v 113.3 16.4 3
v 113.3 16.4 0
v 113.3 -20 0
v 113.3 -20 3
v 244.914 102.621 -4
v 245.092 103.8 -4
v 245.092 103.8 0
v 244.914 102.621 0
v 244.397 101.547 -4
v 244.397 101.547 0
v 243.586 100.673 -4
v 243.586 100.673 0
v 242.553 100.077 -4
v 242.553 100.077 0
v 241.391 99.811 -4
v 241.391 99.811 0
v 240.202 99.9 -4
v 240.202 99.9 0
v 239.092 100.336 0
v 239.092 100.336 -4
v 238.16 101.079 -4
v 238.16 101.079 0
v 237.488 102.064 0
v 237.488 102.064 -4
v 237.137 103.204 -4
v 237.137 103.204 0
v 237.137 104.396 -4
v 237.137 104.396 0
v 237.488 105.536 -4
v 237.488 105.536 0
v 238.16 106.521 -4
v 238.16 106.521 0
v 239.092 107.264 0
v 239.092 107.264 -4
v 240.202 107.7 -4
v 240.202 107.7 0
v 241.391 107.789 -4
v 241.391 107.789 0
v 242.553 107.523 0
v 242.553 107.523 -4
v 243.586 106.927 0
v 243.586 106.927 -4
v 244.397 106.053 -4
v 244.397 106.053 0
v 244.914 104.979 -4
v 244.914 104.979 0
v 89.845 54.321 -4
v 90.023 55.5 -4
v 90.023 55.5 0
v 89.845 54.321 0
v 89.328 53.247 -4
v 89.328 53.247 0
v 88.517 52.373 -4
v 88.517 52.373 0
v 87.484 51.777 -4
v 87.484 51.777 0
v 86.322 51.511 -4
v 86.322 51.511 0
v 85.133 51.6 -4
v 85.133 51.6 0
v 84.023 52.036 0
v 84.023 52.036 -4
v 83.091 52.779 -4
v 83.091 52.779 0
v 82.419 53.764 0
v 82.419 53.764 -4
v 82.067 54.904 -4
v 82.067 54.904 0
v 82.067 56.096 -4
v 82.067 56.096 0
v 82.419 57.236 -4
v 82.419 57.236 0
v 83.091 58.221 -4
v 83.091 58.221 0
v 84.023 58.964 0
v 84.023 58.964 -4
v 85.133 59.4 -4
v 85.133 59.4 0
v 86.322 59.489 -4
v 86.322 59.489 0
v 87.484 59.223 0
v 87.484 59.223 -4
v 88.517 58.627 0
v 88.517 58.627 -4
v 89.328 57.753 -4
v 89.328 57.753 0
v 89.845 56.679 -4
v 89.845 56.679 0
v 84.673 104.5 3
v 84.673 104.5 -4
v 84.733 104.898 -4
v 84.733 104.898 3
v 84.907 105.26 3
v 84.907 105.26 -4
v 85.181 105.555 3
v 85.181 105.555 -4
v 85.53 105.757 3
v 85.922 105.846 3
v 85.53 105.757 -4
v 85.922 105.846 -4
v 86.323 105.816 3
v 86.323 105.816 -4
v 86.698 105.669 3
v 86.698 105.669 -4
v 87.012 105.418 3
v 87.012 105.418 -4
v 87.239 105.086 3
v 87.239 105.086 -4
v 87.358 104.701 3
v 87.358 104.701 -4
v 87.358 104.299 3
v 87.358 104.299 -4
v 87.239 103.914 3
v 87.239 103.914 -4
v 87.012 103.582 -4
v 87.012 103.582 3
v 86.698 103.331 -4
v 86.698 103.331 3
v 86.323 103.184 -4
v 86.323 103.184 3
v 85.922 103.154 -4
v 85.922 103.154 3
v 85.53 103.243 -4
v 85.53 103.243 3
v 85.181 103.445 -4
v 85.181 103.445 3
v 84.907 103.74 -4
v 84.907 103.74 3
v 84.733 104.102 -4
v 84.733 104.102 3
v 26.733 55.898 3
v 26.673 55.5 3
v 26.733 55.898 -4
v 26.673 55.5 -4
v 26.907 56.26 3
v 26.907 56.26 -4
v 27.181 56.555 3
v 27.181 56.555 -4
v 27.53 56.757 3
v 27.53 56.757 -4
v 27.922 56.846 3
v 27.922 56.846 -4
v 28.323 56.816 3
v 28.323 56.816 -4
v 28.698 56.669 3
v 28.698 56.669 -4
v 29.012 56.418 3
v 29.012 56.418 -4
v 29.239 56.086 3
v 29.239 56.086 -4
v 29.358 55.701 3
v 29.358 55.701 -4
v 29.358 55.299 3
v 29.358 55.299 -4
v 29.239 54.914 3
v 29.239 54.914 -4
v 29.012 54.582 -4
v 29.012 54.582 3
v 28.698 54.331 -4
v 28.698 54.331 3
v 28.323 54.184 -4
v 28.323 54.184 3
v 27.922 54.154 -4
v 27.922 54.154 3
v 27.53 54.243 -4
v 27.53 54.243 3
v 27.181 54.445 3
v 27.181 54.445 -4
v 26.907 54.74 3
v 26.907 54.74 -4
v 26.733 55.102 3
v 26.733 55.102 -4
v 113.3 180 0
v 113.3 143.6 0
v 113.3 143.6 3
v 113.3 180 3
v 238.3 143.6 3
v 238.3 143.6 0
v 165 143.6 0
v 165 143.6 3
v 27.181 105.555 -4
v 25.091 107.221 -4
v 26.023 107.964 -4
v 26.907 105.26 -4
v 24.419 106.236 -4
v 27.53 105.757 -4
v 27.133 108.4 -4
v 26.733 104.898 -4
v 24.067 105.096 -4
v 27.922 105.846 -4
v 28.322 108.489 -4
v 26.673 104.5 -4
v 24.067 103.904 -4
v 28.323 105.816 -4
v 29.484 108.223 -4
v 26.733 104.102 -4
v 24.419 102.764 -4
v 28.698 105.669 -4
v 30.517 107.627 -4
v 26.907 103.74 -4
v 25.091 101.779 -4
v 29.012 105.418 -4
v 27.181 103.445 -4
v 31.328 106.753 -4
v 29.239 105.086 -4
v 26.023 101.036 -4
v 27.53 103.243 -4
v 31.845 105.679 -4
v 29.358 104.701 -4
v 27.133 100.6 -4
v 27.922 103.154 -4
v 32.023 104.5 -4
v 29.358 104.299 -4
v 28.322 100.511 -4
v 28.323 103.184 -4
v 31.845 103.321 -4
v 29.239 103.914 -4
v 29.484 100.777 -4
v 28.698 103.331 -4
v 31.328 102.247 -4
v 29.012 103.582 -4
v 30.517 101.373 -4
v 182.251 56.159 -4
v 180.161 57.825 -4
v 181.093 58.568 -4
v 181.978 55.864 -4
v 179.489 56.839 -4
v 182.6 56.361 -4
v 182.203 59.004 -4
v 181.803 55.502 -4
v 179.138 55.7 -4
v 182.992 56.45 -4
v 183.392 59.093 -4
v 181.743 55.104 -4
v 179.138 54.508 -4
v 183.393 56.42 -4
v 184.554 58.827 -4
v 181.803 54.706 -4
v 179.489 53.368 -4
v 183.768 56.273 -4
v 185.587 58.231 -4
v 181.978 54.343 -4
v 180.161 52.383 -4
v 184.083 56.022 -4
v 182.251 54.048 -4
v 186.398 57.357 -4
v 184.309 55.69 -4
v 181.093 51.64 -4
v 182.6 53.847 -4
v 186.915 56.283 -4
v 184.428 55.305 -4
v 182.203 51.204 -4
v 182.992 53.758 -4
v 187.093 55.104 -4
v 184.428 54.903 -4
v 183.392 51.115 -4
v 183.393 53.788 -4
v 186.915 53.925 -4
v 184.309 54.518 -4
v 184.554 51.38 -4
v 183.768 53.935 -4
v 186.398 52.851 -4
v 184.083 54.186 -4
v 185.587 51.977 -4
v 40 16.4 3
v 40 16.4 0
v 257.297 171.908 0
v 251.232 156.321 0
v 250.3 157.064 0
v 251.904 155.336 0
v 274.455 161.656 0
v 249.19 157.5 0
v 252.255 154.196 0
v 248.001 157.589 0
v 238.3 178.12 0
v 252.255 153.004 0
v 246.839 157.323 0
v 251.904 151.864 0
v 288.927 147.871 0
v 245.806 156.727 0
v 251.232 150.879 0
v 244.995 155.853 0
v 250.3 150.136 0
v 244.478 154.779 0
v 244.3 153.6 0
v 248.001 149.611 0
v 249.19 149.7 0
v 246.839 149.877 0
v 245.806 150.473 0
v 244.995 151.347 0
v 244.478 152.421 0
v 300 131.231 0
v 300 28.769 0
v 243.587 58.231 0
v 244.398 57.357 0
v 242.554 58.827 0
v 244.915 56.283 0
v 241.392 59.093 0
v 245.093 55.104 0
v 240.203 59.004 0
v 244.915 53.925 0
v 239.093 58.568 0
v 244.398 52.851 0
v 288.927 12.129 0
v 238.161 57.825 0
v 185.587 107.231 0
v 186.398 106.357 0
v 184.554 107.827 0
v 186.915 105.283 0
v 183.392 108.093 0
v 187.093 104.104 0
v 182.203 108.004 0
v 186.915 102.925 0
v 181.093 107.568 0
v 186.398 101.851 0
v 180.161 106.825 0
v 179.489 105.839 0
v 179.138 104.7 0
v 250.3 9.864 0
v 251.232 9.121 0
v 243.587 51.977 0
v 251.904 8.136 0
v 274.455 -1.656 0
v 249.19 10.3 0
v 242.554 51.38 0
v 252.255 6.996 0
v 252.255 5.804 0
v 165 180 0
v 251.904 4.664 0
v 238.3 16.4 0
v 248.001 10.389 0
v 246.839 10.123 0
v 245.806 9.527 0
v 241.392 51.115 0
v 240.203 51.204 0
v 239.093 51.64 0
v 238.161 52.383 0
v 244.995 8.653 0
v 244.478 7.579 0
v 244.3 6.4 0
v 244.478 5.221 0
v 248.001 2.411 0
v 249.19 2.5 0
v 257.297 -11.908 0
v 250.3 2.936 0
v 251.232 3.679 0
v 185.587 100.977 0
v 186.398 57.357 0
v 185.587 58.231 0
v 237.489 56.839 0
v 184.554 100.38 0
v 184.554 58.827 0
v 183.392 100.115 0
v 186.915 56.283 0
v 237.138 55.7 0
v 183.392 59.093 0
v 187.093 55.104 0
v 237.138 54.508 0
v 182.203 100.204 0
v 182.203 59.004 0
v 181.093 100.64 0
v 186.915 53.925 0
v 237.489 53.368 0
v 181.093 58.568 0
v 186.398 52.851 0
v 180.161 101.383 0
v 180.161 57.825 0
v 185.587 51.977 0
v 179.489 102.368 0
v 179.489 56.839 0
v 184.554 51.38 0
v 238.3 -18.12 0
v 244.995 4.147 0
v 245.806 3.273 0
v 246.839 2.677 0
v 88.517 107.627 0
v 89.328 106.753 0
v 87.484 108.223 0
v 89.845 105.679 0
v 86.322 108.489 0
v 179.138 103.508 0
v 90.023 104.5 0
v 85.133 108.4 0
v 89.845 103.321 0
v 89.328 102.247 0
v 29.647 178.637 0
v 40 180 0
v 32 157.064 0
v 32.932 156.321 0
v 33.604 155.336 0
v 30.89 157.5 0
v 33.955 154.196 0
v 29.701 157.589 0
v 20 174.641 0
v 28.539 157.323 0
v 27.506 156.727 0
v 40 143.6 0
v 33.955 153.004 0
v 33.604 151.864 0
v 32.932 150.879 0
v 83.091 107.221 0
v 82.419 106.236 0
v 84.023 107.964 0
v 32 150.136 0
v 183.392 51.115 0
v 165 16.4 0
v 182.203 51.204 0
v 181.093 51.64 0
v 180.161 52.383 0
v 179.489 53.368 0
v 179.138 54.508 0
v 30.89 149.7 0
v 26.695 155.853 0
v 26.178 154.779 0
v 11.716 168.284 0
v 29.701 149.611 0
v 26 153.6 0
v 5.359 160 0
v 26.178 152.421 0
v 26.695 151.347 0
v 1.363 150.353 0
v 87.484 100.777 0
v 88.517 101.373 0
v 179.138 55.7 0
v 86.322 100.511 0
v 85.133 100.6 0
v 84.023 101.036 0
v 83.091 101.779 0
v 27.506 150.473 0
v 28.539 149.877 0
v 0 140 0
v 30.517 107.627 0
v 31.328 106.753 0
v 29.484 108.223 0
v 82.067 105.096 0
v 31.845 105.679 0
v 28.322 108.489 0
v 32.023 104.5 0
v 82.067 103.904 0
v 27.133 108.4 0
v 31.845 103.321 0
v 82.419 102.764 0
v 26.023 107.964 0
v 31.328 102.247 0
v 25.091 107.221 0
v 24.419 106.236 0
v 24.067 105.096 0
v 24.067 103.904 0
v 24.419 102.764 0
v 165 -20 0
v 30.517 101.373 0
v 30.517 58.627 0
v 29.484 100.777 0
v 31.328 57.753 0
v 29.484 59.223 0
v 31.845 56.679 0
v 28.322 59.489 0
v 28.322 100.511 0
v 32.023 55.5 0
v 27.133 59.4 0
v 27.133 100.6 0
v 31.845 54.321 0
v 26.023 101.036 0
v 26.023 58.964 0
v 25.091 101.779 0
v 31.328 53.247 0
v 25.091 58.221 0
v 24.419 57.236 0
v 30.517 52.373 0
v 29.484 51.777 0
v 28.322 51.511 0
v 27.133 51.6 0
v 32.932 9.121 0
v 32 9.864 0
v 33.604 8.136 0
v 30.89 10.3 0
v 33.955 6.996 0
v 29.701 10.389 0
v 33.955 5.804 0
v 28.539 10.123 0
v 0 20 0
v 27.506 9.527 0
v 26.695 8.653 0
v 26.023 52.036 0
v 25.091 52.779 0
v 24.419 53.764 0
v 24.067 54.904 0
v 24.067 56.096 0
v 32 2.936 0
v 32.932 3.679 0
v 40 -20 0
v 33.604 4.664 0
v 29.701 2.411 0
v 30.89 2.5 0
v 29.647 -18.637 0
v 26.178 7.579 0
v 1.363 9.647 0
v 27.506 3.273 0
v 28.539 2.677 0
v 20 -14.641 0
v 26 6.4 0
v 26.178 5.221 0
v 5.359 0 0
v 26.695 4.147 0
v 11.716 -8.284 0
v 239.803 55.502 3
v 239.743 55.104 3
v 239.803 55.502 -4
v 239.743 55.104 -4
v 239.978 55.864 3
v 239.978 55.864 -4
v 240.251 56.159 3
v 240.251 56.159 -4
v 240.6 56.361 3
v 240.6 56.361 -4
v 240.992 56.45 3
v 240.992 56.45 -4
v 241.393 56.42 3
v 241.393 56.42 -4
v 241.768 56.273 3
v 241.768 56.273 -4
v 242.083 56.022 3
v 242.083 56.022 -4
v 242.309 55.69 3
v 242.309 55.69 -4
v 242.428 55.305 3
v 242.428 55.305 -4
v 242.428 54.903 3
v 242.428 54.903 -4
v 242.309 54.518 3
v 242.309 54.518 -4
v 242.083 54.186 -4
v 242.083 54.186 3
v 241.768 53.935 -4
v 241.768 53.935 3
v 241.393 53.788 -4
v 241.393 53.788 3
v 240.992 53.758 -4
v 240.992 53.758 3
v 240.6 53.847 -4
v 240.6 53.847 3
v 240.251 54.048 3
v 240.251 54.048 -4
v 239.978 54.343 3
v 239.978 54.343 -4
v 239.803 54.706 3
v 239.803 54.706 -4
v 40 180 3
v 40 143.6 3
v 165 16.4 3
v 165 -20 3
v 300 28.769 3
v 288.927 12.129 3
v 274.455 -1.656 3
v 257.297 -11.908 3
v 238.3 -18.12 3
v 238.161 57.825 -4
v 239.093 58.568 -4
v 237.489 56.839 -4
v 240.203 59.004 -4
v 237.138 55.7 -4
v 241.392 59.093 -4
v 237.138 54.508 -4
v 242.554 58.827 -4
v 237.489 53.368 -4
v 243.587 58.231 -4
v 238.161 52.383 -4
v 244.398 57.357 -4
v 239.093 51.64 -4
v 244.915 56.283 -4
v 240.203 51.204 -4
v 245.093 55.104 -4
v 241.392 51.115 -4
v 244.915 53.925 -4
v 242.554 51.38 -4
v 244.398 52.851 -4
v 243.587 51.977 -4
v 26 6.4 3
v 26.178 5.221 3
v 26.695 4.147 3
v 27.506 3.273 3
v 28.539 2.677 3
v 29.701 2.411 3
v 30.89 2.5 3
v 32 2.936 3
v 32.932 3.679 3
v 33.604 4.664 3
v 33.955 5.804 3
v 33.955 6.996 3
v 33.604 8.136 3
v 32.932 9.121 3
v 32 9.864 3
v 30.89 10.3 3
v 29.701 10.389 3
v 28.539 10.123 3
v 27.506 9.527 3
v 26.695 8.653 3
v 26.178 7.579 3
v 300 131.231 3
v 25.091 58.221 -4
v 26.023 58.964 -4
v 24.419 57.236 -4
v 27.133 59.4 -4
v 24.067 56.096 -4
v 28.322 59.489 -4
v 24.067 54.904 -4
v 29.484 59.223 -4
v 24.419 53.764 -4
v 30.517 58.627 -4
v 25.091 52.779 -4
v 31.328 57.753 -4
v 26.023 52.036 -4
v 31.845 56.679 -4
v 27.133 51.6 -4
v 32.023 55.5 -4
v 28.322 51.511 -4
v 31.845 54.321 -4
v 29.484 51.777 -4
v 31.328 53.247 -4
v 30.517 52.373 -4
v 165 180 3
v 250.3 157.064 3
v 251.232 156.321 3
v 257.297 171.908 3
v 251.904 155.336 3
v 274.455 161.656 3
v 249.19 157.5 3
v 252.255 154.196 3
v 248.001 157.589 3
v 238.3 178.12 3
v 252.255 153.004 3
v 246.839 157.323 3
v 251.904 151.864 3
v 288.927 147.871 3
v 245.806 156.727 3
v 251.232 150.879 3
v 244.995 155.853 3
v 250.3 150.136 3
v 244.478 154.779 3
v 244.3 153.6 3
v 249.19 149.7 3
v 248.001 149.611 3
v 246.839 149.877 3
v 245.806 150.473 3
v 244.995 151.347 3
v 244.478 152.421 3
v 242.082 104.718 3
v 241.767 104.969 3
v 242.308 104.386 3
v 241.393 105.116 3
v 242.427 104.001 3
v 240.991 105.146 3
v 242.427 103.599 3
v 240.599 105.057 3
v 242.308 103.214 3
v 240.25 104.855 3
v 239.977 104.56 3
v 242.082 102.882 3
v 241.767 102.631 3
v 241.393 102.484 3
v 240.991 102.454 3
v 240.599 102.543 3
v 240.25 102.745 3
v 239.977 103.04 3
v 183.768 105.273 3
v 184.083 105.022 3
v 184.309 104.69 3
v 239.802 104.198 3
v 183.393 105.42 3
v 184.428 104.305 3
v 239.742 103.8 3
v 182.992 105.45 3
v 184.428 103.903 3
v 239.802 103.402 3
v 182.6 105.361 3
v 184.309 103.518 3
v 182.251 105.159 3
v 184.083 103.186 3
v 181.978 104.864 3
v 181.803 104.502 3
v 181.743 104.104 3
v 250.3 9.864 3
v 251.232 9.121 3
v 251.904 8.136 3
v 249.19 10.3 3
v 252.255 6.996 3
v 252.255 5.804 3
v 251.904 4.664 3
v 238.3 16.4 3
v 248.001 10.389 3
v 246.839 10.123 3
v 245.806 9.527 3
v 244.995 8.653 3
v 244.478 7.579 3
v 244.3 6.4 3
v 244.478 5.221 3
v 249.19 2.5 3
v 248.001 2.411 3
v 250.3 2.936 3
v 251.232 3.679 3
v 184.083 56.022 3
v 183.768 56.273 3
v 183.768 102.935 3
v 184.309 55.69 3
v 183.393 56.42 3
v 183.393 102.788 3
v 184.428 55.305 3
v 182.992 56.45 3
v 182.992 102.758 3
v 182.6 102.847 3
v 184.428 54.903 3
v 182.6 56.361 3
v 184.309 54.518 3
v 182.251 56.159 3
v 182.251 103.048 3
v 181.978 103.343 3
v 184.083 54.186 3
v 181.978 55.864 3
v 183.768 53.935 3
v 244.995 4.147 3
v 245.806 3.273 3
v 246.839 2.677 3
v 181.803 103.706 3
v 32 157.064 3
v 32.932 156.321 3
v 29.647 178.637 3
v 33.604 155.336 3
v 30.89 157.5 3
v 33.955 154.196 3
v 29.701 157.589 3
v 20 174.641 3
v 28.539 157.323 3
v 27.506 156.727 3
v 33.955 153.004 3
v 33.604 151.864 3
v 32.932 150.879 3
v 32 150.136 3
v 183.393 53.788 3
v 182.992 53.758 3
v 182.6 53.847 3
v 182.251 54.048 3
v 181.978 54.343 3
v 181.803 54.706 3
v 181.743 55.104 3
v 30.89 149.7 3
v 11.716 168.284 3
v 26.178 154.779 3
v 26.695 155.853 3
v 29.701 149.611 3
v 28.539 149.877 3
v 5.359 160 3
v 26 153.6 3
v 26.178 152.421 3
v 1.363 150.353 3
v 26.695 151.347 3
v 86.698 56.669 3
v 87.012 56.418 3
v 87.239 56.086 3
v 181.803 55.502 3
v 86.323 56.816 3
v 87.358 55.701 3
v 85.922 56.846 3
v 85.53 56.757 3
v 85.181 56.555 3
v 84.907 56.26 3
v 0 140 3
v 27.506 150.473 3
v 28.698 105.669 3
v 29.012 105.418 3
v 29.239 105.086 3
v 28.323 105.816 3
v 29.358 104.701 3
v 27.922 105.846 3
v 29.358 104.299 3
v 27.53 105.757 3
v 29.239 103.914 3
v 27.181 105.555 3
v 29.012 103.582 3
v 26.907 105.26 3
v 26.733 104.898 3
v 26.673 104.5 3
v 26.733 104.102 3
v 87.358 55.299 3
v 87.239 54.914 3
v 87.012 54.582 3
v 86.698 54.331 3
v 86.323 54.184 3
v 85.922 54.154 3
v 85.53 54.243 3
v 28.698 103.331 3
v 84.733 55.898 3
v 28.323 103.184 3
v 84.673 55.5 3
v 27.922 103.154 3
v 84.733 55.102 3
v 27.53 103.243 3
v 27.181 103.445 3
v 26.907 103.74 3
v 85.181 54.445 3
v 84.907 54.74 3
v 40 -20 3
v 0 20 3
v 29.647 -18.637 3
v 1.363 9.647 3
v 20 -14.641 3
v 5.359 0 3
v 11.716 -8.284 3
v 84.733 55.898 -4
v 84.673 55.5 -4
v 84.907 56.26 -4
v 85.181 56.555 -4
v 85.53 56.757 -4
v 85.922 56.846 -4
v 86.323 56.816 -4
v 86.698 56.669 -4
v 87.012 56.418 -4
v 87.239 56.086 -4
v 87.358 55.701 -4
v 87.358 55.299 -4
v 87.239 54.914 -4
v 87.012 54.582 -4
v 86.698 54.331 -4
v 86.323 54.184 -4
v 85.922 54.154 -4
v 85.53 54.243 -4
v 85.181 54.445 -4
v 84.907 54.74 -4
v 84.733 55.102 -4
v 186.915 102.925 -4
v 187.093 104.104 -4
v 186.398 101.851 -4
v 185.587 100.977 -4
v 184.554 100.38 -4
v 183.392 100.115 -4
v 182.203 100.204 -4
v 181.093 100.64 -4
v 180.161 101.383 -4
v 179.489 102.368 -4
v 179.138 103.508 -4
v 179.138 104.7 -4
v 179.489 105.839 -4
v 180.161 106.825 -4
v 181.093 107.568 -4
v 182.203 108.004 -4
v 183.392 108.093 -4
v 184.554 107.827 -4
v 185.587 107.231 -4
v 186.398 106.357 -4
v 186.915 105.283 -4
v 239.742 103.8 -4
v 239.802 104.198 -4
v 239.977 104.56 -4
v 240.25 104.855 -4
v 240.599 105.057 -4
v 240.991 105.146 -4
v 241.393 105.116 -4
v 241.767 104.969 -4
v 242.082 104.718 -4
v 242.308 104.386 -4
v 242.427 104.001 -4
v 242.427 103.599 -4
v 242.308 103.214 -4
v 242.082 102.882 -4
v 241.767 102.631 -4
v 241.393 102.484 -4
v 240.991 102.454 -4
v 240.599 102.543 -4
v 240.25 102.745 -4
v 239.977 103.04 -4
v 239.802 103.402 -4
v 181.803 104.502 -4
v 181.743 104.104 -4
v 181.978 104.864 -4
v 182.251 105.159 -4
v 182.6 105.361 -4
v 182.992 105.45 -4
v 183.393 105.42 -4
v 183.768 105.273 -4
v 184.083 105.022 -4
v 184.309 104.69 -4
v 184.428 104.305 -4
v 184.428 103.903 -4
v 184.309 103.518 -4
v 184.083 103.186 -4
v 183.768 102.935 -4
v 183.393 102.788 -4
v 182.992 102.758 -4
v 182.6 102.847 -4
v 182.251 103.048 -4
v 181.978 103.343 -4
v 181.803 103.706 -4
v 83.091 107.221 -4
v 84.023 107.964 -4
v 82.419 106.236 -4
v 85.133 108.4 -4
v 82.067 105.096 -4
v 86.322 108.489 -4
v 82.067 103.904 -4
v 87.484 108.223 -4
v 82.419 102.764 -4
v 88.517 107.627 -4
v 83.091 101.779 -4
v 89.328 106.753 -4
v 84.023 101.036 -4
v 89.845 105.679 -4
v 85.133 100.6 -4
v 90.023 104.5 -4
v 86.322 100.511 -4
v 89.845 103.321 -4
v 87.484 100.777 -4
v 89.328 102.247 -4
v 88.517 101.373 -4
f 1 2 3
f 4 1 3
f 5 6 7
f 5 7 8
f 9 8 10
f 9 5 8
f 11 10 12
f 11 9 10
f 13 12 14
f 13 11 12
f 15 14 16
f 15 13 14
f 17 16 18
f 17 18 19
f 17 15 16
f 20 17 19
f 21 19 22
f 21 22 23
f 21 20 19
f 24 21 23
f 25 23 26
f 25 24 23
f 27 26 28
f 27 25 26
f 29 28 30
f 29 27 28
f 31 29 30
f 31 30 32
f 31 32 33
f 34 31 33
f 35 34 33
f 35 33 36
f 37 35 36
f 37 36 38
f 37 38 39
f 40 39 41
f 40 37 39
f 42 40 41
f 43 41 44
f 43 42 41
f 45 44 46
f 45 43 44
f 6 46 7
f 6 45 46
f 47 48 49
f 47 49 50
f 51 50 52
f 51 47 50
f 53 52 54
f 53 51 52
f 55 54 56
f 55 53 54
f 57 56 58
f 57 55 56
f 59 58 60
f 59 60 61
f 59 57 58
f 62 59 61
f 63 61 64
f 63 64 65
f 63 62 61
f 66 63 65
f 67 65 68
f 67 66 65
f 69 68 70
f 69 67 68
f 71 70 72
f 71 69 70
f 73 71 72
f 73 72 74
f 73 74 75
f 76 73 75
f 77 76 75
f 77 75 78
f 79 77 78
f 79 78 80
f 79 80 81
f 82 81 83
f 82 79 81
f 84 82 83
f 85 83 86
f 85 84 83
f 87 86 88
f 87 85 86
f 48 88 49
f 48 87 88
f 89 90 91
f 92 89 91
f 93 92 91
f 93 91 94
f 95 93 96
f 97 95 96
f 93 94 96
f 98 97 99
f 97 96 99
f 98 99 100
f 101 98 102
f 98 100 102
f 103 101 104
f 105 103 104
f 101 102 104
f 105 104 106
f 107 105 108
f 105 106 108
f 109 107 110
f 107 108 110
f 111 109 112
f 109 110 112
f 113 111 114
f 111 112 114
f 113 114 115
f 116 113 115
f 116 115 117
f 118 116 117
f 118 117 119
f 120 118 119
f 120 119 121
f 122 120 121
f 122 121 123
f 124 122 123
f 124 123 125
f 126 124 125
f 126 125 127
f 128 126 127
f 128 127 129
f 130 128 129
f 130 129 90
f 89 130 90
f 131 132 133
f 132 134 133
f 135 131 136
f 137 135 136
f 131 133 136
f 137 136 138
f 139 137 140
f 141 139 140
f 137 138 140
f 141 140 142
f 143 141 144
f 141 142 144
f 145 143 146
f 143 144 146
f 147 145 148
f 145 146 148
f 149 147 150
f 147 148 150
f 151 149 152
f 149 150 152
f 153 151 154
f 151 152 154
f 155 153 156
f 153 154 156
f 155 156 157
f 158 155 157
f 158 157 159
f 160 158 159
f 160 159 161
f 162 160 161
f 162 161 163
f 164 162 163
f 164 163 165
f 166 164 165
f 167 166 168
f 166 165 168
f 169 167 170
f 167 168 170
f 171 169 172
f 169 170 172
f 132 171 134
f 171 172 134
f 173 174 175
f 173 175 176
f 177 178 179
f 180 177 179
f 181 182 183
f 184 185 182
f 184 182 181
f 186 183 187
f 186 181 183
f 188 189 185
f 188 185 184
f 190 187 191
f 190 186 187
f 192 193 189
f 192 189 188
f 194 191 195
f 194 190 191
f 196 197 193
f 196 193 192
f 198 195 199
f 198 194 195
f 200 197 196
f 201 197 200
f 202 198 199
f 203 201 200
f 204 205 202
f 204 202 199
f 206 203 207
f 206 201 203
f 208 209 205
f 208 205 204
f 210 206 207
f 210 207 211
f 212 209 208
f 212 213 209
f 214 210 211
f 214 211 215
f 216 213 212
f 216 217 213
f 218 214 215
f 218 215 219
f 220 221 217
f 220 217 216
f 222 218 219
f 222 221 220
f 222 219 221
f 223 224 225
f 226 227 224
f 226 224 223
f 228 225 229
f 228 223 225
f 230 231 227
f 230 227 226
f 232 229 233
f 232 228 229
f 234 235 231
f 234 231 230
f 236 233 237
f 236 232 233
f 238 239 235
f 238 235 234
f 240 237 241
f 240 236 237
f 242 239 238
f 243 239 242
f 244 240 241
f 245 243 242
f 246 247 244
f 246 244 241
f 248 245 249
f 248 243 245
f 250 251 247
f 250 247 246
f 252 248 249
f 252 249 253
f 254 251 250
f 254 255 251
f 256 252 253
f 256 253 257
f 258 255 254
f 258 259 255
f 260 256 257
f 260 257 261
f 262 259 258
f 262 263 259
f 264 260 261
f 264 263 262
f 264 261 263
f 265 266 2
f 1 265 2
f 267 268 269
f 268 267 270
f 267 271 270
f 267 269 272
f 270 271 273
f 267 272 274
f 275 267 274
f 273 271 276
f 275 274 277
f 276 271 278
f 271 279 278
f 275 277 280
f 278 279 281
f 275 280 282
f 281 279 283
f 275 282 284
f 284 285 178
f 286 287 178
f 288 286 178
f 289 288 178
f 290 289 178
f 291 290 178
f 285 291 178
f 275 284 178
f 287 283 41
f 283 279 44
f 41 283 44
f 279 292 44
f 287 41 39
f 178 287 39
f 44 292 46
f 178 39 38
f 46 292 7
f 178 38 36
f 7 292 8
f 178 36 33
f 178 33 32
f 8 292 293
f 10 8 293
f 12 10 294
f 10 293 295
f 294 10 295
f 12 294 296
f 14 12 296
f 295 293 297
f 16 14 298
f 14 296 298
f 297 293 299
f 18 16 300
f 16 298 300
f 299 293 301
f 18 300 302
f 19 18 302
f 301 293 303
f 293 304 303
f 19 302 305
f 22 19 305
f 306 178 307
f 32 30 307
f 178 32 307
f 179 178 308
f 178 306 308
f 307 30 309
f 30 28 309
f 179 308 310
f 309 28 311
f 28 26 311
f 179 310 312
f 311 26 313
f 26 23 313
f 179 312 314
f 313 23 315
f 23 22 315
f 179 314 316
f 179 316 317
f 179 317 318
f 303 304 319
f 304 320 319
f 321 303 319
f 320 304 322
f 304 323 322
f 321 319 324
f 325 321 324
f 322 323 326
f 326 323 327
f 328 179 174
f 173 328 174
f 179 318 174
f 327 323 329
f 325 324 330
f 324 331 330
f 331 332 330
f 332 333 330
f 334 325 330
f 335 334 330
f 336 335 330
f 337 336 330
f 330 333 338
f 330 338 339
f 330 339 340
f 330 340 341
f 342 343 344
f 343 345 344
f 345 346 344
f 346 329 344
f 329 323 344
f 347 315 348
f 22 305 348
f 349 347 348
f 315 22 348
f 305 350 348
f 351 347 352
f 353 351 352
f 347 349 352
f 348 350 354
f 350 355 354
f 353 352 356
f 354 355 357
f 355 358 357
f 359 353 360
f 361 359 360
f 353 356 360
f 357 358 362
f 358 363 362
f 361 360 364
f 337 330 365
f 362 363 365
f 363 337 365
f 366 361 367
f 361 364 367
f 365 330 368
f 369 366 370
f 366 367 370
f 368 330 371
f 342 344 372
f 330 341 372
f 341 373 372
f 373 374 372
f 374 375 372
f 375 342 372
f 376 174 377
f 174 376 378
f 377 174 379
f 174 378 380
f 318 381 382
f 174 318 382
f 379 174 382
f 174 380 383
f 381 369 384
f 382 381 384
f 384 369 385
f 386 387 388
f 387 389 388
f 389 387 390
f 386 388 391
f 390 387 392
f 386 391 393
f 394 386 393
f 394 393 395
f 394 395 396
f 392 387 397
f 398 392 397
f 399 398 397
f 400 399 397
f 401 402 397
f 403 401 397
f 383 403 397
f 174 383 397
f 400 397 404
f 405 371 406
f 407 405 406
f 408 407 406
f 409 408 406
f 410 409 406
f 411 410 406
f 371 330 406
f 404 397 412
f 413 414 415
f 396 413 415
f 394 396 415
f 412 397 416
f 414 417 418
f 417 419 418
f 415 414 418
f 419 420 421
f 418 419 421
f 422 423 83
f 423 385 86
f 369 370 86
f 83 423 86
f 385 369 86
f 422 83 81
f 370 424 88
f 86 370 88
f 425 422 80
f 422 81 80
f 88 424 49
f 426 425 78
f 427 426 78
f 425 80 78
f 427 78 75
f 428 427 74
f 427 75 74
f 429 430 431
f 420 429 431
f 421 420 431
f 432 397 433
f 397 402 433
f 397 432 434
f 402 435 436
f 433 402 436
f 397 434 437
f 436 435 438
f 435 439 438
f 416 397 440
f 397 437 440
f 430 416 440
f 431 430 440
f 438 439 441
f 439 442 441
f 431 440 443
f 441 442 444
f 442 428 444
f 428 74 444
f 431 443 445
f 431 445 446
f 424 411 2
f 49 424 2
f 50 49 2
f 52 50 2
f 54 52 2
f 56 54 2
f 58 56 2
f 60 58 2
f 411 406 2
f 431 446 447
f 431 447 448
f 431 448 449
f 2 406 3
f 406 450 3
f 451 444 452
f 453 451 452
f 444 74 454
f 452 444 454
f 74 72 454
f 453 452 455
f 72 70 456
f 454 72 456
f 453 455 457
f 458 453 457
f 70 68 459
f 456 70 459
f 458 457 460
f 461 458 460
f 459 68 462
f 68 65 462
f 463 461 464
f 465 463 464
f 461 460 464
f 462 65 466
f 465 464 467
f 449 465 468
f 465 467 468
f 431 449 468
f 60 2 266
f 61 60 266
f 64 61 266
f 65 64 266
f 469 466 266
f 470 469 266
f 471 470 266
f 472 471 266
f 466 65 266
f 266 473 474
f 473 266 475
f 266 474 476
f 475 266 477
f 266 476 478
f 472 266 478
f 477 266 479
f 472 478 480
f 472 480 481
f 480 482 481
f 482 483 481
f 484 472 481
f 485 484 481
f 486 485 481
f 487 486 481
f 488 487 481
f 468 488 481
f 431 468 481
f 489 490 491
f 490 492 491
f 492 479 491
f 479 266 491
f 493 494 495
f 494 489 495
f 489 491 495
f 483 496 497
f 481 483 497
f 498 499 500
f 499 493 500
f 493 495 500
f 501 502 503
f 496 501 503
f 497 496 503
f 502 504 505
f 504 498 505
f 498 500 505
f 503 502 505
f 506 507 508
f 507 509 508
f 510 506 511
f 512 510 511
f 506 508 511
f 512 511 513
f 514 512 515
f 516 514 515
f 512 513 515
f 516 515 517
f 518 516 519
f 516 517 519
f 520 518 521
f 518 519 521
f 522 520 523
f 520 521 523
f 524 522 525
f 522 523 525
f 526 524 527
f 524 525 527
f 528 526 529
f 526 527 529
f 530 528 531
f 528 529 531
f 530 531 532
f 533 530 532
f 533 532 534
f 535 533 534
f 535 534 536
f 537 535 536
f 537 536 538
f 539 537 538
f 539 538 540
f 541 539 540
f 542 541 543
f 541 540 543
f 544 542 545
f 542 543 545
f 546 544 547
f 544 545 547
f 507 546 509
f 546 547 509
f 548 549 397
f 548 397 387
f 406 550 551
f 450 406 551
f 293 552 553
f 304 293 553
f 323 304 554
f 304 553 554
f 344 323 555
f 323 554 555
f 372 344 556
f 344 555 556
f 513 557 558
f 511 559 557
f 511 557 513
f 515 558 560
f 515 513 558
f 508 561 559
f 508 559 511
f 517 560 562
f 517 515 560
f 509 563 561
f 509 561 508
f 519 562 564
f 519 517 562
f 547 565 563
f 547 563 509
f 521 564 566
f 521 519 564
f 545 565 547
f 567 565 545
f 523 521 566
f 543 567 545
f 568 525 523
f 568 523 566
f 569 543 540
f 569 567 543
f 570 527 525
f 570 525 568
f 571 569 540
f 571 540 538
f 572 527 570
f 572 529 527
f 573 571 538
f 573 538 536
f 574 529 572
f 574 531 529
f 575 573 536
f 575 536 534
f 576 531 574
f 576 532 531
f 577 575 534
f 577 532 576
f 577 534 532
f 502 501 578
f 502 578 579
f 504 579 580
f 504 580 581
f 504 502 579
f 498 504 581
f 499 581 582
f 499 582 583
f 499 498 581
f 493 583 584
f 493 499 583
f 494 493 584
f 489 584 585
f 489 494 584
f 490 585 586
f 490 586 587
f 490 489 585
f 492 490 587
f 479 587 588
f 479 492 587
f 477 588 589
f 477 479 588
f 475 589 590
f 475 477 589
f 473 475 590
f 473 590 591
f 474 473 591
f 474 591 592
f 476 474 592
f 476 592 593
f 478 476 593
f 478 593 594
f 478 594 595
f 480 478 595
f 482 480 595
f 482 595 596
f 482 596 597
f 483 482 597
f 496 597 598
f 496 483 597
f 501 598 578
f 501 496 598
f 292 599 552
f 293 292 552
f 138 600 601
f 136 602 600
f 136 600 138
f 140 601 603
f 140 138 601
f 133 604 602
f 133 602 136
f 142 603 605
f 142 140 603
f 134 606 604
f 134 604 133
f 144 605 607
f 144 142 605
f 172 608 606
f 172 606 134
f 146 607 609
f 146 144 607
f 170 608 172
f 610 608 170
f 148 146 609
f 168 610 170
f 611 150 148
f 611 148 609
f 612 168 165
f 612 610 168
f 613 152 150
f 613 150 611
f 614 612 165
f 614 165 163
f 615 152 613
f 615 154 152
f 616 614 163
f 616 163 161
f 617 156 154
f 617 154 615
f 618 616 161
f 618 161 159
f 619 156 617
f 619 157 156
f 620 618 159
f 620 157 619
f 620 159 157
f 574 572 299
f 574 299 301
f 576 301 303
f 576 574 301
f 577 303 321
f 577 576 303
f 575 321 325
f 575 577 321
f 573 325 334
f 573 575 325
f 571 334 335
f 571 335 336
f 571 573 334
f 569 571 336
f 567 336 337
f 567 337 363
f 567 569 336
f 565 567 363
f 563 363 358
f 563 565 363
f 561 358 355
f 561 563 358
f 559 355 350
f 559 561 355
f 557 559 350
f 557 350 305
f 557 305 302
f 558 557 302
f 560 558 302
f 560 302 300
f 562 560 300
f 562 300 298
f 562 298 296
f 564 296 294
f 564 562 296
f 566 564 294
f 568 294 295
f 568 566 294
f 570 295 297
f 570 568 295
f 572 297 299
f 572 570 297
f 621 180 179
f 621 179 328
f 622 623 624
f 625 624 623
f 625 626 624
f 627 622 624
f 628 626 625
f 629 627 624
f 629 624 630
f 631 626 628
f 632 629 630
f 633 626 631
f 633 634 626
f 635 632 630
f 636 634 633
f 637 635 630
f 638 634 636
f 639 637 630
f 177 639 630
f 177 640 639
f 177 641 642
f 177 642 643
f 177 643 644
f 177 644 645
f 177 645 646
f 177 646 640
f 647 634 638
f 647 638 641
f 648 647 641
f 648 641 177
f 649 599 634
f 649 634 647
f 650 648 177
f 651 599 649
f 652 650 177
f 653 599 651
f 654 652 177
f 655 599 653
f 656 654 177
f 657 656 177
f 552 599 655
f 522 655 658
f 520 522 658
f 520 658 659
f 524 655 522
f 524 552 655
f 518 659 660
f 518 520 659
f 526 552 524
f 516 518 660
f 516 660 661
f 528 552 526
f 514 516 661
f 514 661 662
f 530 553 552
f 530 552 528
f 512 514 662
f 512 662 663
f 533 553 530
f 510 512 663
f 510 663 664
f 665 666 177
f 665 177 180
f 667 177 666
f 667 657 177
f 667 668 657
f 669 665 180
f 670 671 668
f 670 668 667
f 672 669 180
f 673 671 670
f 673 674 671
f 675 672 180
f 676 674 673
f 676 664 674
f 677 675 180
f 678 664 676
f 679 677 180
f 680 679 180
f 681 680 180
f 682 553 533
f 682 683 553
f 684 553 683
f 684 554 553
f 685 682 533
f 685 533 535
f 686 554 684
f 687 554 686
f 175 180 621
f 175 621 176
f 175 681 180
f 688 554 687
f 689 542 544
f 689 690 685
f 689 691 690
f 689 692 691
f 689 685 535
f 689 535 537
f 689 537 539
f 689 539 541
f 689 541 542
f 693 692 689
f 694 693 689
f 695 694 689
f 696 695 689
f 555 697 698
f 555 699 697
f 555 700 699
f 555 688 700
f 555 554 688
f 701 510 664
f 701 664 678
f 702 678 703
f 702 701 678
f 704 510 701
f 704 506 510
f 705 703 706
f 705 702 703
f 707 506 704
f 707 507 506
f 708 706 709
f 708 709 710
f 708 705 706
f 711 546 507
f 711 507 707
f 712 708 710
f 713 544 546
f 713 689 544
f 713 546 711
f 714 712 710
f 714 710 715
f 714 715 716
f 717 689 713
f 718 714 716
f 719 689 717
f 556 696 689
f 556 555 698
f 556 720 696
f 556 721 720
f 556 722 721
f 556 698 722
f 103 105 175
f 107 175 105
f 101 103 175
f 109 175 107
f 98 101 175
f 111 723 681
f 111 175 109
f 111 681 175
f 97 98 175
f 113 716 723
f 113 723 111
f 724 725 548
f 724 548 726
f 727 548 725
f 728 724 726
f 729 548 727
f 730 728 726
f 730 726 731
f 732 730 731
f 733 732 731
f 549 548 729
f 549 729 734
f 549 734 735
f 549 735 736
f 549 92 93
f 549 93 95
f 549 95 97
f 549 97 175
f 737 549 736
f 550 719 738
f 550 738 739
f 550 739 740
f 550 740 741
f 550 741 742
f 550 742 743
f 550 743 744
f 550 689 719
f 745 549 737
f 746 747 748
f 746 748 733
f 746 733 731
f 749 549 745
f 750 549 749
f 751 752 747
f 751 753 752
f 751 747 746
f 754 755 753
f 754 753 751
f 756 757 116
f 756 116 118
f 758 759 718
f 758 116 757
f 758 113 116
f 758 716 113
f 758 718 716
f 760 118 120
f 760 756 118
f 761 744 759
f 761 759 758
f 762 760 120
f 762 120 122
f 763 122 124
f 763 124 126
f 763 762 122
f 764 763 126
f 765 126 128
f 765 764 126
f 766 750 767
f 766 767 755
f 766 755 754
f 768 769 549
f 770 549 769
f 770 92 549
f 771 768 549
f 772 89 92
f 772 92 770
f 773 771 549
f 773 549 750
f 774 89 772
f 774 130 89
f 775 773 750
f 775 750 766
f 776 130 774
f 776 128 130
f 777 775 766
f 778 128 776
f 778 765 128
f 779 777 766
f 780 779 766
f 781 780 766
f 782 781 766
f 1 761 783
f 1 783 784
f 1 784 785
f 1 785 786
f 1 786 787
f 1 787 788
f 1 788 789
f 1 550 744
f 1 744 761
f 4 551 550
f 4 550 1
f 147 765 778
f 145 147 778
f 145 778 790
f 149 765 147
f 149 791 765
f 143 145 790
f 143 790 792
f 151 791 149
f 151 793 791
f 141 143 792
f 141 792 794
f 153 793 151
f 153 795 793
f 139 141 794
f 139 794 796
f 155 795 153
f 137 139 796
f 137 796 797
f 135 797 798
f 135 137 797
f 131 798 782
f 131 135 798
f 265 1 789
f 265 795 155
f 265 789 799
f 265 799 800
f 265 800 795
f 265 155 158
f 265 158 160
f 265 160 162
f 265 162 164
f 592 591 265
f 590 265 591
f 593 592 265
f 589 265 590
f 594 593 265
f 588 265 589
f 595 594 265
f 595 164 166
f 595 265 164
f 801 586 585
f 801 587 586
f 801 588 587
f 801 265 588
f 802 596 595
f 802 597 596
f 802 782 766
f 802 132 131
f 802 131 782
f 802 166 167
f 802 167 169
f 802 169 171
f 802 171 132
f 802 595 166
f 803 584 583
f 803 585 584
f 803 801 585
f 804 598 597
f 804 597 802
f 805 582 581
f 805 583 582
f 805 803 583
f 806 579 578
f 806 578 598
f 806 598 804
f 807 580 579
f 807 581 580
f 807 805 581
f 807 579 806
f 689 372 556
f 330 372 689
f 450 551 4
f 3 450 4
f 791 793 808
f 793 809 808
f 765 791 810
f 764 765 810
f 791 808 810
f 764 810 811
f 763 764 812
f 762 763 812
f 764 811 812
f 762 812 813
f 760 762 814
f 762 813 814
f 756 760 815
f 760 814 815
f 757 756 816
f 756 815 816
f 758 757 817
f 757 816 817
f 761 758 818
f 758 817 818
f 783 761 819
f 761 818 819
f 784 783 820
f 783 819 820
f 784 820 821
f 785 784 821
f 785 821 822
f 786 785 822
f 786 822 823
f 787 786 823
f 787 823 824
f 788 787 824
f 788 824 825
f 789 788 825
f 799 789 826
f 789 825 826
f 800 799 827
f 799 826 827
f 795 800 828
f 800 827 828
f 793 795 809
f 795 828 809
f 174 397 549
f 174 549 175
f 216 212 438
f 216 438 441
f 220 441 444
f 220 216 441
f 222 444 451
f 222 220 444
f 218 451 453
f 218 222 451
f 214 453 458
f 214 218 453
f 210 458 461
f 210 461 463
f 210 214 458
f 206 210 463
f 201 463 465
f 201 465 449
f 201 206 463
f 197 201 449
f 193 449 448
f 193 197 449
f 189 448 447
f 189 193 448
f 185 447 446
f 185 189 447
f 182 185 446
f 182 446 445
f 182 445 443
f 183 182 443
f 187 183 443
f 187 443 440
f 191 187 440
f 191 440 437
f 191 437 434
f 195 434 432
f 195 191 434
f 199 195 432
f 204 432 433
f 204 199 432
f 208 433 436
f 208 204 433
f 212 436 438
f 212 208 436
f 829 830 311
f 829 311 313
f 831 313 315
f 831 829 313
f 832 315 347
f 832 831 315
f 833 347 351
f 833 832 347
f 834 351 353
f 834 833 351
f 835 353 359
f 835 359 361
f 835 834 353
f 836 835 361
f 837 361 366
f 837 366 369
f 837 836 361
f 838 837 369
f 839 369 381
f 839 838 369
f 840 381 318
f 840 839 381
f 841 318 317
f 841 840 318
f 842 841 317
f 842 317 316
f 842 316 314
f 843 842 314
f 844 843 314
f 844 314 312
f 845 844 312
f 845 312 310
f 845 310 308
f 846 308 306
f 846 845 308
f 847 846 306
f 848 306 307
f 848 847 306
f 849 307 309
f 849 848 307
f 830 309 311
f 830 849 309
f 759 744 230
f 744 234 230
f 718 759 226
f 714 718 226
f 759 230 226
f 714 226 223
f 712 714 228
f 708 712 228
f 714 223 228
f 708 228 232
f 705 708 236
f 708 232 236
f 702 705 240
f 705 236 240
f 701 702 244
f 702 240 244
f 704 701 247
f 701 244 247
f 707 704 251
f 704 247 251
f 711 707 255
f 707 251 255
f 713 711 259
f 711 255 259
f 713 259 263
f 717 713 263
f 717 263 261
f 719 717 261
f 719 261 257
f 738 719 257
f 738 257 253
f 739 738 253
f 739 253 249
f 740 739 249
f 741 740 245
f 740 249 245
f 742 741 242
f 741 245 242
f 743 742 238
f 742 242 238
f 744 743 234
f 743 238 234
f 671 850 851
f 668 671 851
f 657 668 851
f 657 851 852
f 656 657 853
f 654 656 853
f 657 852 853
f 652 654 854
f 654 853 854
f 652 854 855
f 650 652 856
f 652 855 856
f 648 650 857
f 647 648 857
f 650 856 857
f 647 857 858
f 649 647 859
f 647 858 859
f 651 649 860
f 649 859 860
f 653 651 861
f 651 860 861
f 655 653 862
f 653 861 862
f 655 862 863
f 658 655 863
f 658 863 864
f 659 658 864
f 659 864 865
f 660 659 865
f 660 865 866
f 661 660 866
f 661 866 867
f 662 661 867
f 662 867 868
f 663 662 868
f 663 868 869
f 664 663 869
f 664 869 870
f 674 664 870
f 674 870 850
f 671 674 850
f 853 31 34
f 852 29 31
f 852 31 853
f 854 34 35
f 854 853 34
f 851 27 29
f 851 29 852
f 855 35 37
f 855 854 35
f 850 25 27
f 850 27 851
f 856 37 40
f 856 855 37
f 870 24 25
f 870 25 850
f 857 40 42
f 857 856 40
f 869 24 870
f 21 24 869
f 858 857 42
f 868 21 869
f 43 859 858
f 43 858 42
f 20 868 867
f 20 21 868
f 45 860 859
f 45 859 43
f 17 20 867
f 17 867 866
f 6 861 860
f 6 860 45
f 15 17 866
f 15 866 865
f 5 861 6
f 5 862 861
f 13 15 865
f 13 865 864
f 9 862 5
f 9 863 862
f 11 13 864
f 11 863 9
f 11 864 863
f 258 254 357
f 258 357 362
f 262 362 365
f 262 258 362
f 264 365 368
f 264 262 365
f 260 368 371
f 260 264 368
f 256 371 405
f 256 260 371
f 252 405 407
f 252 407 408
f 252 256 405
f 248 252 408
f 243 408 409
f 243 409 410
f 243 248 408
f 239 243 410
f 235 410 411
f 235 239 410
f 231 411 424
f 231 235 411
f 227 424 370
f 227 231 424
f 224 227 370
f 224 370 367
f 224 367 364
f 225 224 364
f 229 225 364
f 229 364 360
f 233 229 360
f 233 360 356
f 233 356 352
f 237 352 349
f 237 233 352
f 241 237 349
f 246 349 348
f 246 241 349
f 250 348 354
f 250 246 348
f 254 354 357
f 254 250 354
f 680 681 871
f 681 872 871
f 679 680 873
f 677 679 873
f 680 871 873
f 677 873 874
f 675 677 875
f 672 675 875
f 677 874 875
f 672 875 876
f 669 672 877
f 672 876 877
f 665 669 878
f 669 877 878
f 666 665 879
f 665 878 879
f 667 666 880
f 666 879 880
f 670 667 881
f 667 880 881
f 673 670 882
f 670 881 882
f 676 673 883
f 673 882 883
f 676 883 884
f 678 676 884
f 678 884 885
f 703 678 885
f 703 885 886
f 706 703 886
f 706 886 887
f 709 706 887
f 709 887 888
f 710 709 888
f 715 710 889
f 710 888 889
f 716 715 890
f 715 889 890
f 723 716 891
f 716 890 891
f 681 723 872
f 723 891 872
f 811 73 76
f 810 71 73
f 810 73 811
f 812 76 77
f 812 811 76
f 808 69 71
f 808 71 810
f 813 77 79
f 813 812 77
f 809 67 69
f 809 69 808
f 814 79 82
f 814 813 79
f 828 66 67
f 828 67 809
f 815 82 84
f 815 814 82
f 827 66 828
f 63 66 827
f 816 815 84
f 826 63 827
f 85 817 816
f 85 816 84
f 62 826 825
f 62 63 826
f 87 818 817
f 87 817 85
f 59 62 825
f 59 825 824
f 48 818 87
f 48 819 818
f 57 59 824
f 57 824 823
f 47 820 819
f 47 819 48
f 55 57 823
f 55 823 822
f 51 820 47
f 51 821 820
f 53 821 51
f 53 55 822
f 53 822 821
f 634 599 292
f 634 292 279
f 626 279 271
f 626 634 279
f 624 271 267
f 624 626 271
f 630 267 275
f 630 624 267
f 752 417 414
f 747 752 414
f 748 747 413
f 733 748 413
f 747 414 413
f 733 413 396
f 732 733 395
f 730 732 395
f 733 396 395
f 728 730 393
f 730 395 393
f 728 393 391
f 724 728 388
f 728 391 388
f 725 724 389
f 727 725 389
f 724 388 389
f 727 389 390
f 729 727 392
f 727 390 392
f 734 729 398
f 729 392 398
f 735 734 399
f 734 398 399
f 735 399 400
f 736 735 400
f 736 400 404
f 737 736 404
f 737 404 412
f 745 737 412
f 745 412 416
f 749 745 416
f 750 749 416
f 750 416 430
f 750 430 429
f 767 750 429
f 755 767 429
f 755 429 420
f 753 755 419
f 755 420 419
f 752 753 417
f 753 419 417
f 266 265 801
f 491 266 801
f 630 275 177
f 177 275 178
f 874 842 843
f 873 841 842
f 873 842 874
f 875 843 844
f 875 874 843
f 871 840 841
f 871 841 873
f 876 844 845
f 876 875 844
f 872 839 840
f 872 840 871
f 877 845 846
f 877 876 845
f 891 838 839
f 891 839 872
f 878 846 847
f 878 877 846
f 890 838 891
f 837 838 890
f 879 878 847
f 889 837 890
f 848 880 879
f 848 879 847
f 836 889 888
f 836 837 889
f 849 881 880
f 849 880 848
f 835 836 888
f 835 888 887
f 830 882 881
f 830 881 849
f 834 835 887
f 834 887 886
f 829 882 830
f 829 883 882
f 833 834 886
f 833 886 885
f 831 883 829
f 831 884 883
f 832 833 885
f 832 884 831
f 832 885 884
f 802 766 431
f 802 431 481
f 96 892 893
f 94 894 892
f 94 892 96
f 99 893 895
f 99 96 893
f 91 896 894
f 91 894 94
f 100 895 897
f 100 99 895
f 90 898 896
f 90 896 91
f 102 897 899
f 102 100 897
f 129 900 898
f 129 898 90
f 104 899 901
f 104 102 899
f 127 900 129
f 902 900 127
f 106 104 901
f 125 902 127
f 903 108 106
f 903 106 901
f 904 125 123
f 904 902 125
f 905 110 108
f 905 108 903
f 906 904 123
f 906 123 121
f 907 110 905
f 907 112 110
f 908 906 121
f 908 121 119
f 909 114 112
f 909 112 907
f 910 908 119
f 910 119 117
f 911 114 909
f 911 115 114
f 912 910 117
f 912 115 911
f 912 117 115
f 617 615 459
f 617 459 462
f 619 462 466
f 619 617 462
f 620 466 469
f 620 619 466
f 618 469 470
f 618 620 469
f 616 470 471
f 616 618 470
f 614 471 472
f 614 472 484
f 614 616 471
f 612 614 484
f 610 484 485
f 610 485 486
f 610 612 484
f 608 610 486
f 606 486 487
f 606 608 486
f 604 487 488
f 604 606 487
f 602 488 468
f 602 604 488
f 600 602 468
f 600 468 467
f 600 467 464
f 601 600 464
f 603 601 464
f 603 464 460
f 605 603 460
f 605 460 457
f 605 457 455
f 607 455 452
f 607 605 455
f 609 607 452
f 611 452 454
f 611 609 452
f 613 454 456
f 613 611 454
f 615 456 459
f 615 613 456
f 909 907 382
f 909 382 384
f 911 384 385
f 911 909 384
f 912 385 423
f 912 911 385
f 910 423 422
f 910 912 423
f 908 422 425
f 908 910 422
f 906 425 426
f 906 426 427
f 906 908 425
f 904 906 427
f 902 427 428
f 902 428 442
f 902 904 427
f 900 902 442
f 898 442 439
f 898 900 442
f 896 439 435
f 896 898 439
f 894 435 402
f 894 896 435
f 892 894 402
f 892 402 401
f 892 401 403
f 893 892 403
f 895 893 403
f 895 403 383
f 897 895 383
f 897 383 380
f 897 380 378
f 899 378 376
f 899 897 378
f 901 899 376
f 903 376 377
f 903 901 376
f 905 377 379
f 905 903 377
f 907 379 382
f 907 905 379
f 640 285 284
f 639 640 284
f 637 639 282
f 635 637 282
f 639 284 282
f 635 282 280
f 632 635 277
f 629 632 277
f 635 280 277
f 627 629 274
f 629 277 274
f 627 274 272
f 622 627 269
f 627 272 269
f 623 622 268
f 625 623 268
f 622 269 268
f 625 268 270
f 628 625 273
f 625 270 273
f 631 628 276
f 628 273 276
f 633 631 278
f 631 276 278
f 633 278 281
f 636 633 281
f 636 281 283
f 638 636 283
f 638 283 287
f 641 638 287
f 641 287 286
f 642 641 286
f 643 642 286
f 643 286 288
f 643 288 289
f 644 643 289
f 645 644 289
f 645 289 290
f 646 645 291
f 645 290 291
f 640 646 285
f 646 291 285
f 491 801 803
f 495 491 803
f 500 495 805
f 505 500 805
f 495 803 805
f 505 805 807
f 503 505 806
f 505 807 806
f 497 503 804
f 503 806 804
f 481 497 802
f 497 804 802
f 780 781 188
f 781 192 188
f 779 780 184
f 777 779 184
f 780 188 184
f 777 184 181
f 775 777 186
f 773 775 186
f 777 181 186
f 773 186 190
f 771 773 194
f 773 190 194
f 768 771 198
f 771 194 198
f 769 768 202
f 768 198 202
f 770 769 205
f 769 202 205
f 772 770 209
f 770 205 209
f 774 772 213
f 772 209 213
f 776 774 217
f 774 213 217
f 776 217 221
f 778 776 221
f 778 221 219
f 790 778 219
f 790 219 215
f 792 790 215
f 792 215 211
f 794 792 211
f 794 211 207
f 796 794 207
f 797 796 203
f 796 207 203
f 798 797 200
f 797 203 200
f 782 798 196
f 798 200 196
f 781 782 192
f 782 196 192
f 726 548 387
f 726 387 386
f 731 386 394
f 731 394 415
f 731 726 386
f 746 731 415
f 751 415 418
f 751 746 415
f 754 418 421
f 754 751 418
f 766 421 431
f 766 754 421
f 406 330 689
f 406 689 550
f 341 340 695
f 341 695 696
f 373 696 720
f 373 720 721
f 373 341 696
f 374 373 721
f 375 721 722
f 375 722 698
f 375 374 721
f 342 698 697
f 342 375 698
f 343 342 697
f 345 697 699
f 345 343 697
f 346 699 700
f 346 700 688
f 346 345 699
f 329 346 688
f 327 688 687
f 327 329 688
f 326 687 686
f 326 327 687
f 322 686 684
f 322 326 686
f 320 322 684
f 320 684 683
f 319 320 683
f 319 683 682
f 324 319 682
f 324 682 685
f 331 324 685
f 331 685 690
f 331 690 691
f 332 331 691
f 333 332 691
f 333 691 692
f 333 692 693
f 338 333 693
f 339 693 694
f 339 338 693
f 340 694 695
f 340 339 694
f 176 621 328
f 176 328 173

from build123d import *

# Parameters (mm, degrees)
SKETCH_1_R          = 2
SKETCH_1_W          = 15
SKETCH_1_H          = 3
EXTRUDE_1_DEPTH     = 3
CUT_EXTRUDE_1_REACH = 360.482
SKETCH_2_W          = 15
SKETCH_2_H          = 3
SKETCH_3_R          = 2
EXTRUDE_2_DEPTH     = 3
SKETCH_4_W          = 15
SKETCH_4_H          = 3
CUT_EXTRUDE_2_DEPTH = 10
EXTRUDE_START       = -3
EXTRUDE_3_DEPTH     = 3
SKETCH_10_R         = 4
CUT_EXTRUDE_3_DEPTH = 3
SKETCH_11_R         = 1.35
CUT_EXTRUDE_4_DEPTH = 3
EXTRUDE_START_2     = 4
SKETCH_12_R         = 4
SKETCH_12_R_2       = 1.35
EXTRUDE_4_DEPTH     = 4
SKETCH_13_R         = 1.35
CUT_EXTRUDE_5_DEPTH = 3
SKETCH_14_R         = 4
SKETCH_14_R_2       = 1.35
EXTRUDE_5_DEPTH     = 4
CUT_EXTRUDE_START   = -4
CUT_EXTRUDE_6_DEPTH = 4


with BuildPart() as part:
    # 草图1 → 凸台-拉伸1 (new body)
    with BuildSketch(Plane.XY.offset(3)):
        with BuildLine():
            Line((165, 0), (165, 28))
            Line((165, 28), (173, 28))
            Line((173, 28), (173, 31.7))
            Line((173, 31.7), (188, 31.7))
            Line((188, 31.7), (188, 28))
            Line((188, 28), (238.3, 28))
            Line((238.3, 28), (238.3, 1.880138448))
            ThreePointArc((238.3, 1.880138448), (310, 90), (238.3, 178.119861552))
            Line((238.3, 178.119861552), (238.3, 152))
            Line((238.3, 152), (188, 152))
            Line((188, 152), (188, 148.3))
            Line((188, 148.3), (173, 148.3))
            Line((173, 148.3), (173, 152))
            Line((173, 152), (165, 152))
            Line((165, 152), (165, 180))
            Line((165, 180), (113.3, 180))
            Line((113.3, 180), (113.3, 152))
            Line((113.3, 152), (63, 152))
            Line((63, 152), (63, 148.3))
            Line((63, 148.3), (48, 148.3))
            Line((48, 148.3), (48, 152))
            Line((48, 152), (40, 152))
            Line((40, 152), (40, 180))
            ThreePointArc((40, 180), (11.715728753, 168.284271247), (0, 140))
            Line((0, 140), (0, 40))
            ThreePointArc((0, 40), (11.715728753, 11.715728753), (40, 0))
            Line((40, 0), (40, 28))
            Line((40, 28), (48, 28))
            Line((48, 28), (48, 31.7))
            Line((48, 31.7), (63, 31.7))
            Line((63, 31.7), (63, 28))
            Line((63, 28), (113.3, 28))
            Line((113.3, 28), (113.3, 0))
            Line((113.3, 0), (165, 0))
        make_face()
        with Locations(Location((233.9, 84.9, 0), (0, 0, 180))):
            Circle(SKETCH_1_R, mode=Mode.SUBTRACT)
        with Locations(Location((186.1, 84.9, 0), (0, 0, 180))):
            Circle(SKETCH_1_R, mode=Mode.SUBTRACT)
        with Locations(Location((28, 166, 0), (0, 0, 180))):
            Circle(SKETCH_1_R, mode=Mode.SUBTRACT)
        with Locations(Location((28, 14, 0), (0, 0, 180))):
            Circle(SKETCH_1_R, mode=Mode.SUBTRACT)
        with Locations(Location((248.3, 165.059930776, 0), (0, 0, 180))):
            Circle(SKETCH_1_R, mode=Mode.SUBTRACT)
        with Locations(Location((248.3, 14.940069224, 0), (0, 0, 180))):
            Circle(SKETCH_1_R, mode=Mode.SUBTRACT)
        with Locations(Location((139.15, 14, 0), (0, 0, 180))):
            Circle(SKETCH_1_R, mode=Mode.SUBTRACT)
        with Locations(Location((139.15, 166, 0), (0, 0, 180))):
            Circle(SKETCH_1_R, mode=Mode.SUBTRACT)
        with Locations((55.5, 52)):
            Rectangle(SKETCH_1_W, SKETCH_1_H, mode=Mode.SUBTRACT)
        with Locations((180.5, 52)):
            Rectangle(SKETCH_1_W, SKETCH_1_H, mode=Mode.SUBTRACT)
        with Locations((180.5, 128)):
            Rectangle(SKETCH_1_W, SKETCH_1_H, mode=Mode.SUBTRACT)
        with Locations((55.5, 128)):
            Rectangle(SKETCH_1_W, SKETCH_1_H, mode=Mode.SUBTRACT)
    extrude(amount=-EXTRUDE_1_DEPTH)

    # 草图2 → 切除-拉伸1 (cut, up to next)
    with BuildSketch(Plane(origin=(0, 0, 0), x_dir=(-1, 0, 0), z_dir=(0, 0, -1)), mode=Mode.PRIVATE) as cut_extrude_1_sk1:
        with Locations((-55.280073226, 119.6)):
            Rectangle(SKETCH_2_W, SKETCH_2_H)
    cut_extrude_1_tool1 = extrude(cut_extrude_1_sk1.sketch, amount=-CUT_EXTRUDE_1_REACH, mode=Mode.PRIVATE) & part.part
    # 草图2 → 切除-拉伸1 (cut, up to next)
    with BuildSketch(Plane(origin=(0, 0, 0), x_dir=(-1, 0, 0), z_dir=(0, 0, -1)), mode=Mode.PRIVATE) as cut_extrude_1_sk2:
        Polygon((-48, 152), (-40, 152), (-40, 143.6), (-48, 143.6), (-48, 139.9), (-63, 139.9), (-63, 143.6), (-113.3, 143.6), (-113.3, 152), (-63, 152), (-63, 148.3), (-48, 148.3), align=None)
    cut_extrude_1_tool2 = extrude(cut_extrude_1_sk2.sketch, amount=-CUT_EXTRUDE_1_REACH, mode=Mode.PRIVATE) & part.part
    add(cut_extrude_1_tool1.solids().sort_by_distance((55.280073, 119.6, 0))[0], mode=Mode.SUBTRACT)
    add(cut_extrude_1_tool2.solids().sort_by_distance((76.65, 147.042838, 0))[0], mode=Mode.SUBTRACT)

    # 草图3 → 凸台-拉伸2 (add)
    with BuildSketch(Plane.XY.offset(3)):
        with Locations((186.1, 84.9)):
            Circle(SKETCH_3_R)
        with Locations((233.9, 84.9)):
            Circle(SKETCH_3_R)
    extrude(amount=-EXTRUDE_2_DEPTH)

    # 草图4 → 切除-拉伸2 (cut)
    with BuildSketch(Plane(origin=(0, 0, 0), x_dir=(-1, 0, 0), z_dir=(0, 0, -1))):
        with Locations((-180.685567248, 119.6)):
            Rectangle(SKETCH_4_W, SKETCH_4_H)
        Polygon((-238.3, 143.6), (-188, 143.6), (-188, 139.9), (-173, 139.9), (-173, 143.6), (-165, 143.6), (-165, 152), (-173, 152), (-173, 148.3), (-188, 148.3), (-188, 152), (-238.3, 152), align=None)
    extrude(amount=-CUT_EXTRUDE_2_DEPTH, mode=Mode.SUBTRACT)

    # Split Bodies 4
    split(bisect_by=Plane.ZX.offset(90), keep=Keep.TOP)

    # 草图9 → 凸台-拉伸3 (add)
    with BuildSketch(Plane(origin=(0, 0, 0), x_dir=(-1, 0, 0), z_dir=(0, 0, -1)).offset(EXTRUDE_START)):
        with BuildLine():
            Line((-310, 80), (0, 80))
            Line((0, 80), (0, 140))
            ThreePointArc((0, 140), (-11.715728753, 168.284271247), (-40, 180))
            Line((-40, 180), (-40, 143.6))
            Line((-40, 143.6), (-113.3, 143.6))
            Line((-113.3, 143.6), (-113.3, 180))
            Line((-113.3, 180), (-165, 180))
            Line((-165, 180), (-165, 143.6))
            Line((-165, 143.6), (-238.3, 143.6))
            Line((-238.3, 143.6), (-238.3, 178.119861552))
            ThreePointArc((-238.3, 178.119861552), (-289.810457669, 146.802288686), (-310, 90))
            Line((-310, 90), (-310, 80))
        make_face()
    extrude(amount=EXTRUDE_3_DEPTH)

    # 草图10 → 切除-拉伸3 (cut)
    with BuildSketch(Plane(origin=(0, 0, 0), x_dir=(-1, 0, 0), z_dir=(0, 0, -1))):
        with Locations((-248.3, 153.6)):
            Circle(SKETCH_10_R)
        with Locations((-30, 153.6)):
            Circle(SKETCH_10_R)
    extrude(amount=-CUT_EXTRUDE_3_DEPTH, mode=Mode.SUBTRACT)

    # 镜向2: part across plane


with BuildPart() as part_1:
    add(part.part)
    add(part.part.mirror(Plane(origin=(310, 80, 328.729949498), x_dir=(0, 0, 1), z_dir=(0, -1, 0))))

    # 草图11 → 切除-拉伸4 (cut)
    with BuildSketch(Plane(origin=(0, 0, 0), x_dir=(-1, 0, 0), z_dir=(0, 0, -1))):
        with Locations((-86.022725282, 104.5)):
            Circle(SKETCH_11_R)
        with Locations((-86.022725282, 55.5)):
            Circle(SKETCH_11_R)
        with Locations((-28.022725282, 104.5)):
            Circle(SKETCH_11_R)
        with Locations((-28.022725282, 55.5)):
            Circle(SKETCH_11_R)
    extrude(amount=-CUT_EXTRUDE_4_DEPTH, mode=Mode.SUBTRACT)

    # 草图12 → 凸台-拉伸4 (add)
    # profile 1 of 4: a face of its own
    with BuildSketch(Plane(origin=(0, 0, 0), x_dir=(-1, 0, 0), z_dir=(0, 0, -1)).offset(EXTRUDE_START_2)):
        with Locations(Location((-86.022725282, 104.5, 0), (0, 0, 180))):
            Circle(SKETCH_12_R)
        with Locations((-86.022725282, 104.5)):
            Circle(SKETCH_12_R_2, mode=Mode.SUBTRACT)
    # profile 2 of 4: a face of its own
    with BuildSketch(Plane(origin=(0, 0, 0), x_dir=(-1, 0, 0), z_dir=(0, 0, -1)).offset(EXTRUDE_START_2)):
        with Locations(Location((-28.022725282, 104.5, 0), (0, 0, 180))):
            Circle(SKETCH_12_R)
        with Locations((-28.022725282, 104.5)):
            Circle(SKETCH_12_R_2, mode=Mode.SUBTRACT)
    # profile 3 of 4: a face of its own
    with BuildSketch(Plane(origin=(0, 0, 0), x_dir=(-1, 0, 0), z_dir=(0, 0, -1)).offset(EXTRUDE_START_2)):
        with Locations(Location((-28.022725282, 55.5, 0), (0, 0, 180))):
            Circle(SKETCH_12_R)
        with Locations((-28.022725282, 55.5)):
            Circle(SKETCH_12_R_2, mode=Mode.SUBTRACT)
    # profile 4 of 4: a face of its own
    with BuildSketch(Plane(origin=(0, 0, 0), x_dir=(-1, 0, 0), z_dir=(0, 0, -1)).offset(EXTRUDE_START_2)):
        with Locations(Location((-86.022725282, 55.5, 0), (0, 0, 180))):
            Circle(SKETCH_12_R)
        with Locations((-86.022725282, 55.5)):
            Circle(SKETCH_12_R_2, mode=Mode.SUBTRACT)
    extrude(amount=-EXTRUDE_4_DEPTH)

    # 草图13 → 切除-拉伸5 (cut)
    with BuildSketch(Plane(origin=(0, 0, 0), x_dir=(-1, 0, 0), z_dir=(0, 0, -1))):
        with Locations((-183.092928671, 55.103896104)):
            Circle(SKETCH_13_R)
        with Locations((-183.092928671, 104.103896104)):
            Circle(SKETCH_13_R)
        with Locations((-241.09213252, 103.8)):
            Circle(SKETCH_13_R)
        with Locations((-241.092928671, 55.103896104)):
            Circle(SKETCH_13_R)
    extrude(amount=-CUT_EXTRUDE_5_DEPTH, mode=Mode.SUBTRACT)

    # 草图14 → 凸台-拉伸5 (add)
    # profile 1 of 4: a face of its own
    with BuildSketch(Plane(origin=(0, 0, 0), x_dir=(-1, 0, 0), z_dir=(0, 0, -1)).offset(EXTRUDE_START_2)):
        with Locations(Location((-241.09213252, 103.8, 0), (0, 0, 180))):
            Circle(SKETCH_14_R)
        with Locations((-241.09213252, 103.8)):
            Circle(SKETCH_14_R_2, mode=Mode.SUBTRACT)
    # profile 2 of 4: a face of its own
    with BuildSketch(Plane(origin=(0, 0, 0), x_dir=(-1, 0, 0), z_dir=(0, 0, -1)).offset(EXTRUDE_START_2)):
        with Locations(Location((-183.092928671, 104.103896104, 0), (0, 0, 180))):
            Circle(SKETCH_14_R)
        with Locations((-183.092928671, 104.103896104)):
            Circle(SKETCH_14_R_2, mode=Mode.SUBTRACT)
    # profile 3 of 4: a face of its own
    with BuildSketch(Plane(origin=(0, 0, 0), x_dir=(-1, 0, 0), z_dir=(0, 0, -1)).offset(EXTRUDE_START_2)):
        with Locations(Location((-241.092928671, 55.103896104, 0), (0, 0, 180))):
            Circle(SKETCH_14_R)
        with Locations((-241.092928671, 55.103896104)):
            Circle(SKETCH_14_R_2, mode=Mode.SUBTRACT)
    # profile 4 of 4: a face of its own
    with BuildSketch(Plane(origin=(0, 0, 0), x_dir=(-1, 0, 0), z_dir=(0, 0, -1)).offset(EXTRUDE_START_2)):
        with Locations(Location((-183.092928671, 55.103896104, 0), (0, 0, 180))):
            Circle(SKETCH_14_R)
        with Locations((-183.092928671, 55.103896104)):
            Circle(SKETCH_14_R_2, mode=Mode.SUBTRACT)
    extrude(amount=-EXTRUDE_5_DEPTH)

    # 草图15 → 切除-拉伸6 (cut)
    with BuildSketch(Plane(origin=(0, 0, 0), x_dir=(-1, 0, 0), z_dir=(0, 0, -1)).offset(CUT_EXTRUDE_START)):
        with BuildLine():
            Line((-300, 131.231056256), (-300, 28.768943744))
            ThreePointArc((-300, 28.768943744), (-307.464278423, 48.786796564), (-310, 70))
            Line((-310, 70), (-310, 90))
            ThreePointArc((-310, 90), (-307.464278423, 111.213203436), (-300, 131.231056256))
        make_face()
    extrude(amount=CUT_EXTRUDE_6_DEPTH, mode=Mode.SUBTRACT)


solid = part_1.part
